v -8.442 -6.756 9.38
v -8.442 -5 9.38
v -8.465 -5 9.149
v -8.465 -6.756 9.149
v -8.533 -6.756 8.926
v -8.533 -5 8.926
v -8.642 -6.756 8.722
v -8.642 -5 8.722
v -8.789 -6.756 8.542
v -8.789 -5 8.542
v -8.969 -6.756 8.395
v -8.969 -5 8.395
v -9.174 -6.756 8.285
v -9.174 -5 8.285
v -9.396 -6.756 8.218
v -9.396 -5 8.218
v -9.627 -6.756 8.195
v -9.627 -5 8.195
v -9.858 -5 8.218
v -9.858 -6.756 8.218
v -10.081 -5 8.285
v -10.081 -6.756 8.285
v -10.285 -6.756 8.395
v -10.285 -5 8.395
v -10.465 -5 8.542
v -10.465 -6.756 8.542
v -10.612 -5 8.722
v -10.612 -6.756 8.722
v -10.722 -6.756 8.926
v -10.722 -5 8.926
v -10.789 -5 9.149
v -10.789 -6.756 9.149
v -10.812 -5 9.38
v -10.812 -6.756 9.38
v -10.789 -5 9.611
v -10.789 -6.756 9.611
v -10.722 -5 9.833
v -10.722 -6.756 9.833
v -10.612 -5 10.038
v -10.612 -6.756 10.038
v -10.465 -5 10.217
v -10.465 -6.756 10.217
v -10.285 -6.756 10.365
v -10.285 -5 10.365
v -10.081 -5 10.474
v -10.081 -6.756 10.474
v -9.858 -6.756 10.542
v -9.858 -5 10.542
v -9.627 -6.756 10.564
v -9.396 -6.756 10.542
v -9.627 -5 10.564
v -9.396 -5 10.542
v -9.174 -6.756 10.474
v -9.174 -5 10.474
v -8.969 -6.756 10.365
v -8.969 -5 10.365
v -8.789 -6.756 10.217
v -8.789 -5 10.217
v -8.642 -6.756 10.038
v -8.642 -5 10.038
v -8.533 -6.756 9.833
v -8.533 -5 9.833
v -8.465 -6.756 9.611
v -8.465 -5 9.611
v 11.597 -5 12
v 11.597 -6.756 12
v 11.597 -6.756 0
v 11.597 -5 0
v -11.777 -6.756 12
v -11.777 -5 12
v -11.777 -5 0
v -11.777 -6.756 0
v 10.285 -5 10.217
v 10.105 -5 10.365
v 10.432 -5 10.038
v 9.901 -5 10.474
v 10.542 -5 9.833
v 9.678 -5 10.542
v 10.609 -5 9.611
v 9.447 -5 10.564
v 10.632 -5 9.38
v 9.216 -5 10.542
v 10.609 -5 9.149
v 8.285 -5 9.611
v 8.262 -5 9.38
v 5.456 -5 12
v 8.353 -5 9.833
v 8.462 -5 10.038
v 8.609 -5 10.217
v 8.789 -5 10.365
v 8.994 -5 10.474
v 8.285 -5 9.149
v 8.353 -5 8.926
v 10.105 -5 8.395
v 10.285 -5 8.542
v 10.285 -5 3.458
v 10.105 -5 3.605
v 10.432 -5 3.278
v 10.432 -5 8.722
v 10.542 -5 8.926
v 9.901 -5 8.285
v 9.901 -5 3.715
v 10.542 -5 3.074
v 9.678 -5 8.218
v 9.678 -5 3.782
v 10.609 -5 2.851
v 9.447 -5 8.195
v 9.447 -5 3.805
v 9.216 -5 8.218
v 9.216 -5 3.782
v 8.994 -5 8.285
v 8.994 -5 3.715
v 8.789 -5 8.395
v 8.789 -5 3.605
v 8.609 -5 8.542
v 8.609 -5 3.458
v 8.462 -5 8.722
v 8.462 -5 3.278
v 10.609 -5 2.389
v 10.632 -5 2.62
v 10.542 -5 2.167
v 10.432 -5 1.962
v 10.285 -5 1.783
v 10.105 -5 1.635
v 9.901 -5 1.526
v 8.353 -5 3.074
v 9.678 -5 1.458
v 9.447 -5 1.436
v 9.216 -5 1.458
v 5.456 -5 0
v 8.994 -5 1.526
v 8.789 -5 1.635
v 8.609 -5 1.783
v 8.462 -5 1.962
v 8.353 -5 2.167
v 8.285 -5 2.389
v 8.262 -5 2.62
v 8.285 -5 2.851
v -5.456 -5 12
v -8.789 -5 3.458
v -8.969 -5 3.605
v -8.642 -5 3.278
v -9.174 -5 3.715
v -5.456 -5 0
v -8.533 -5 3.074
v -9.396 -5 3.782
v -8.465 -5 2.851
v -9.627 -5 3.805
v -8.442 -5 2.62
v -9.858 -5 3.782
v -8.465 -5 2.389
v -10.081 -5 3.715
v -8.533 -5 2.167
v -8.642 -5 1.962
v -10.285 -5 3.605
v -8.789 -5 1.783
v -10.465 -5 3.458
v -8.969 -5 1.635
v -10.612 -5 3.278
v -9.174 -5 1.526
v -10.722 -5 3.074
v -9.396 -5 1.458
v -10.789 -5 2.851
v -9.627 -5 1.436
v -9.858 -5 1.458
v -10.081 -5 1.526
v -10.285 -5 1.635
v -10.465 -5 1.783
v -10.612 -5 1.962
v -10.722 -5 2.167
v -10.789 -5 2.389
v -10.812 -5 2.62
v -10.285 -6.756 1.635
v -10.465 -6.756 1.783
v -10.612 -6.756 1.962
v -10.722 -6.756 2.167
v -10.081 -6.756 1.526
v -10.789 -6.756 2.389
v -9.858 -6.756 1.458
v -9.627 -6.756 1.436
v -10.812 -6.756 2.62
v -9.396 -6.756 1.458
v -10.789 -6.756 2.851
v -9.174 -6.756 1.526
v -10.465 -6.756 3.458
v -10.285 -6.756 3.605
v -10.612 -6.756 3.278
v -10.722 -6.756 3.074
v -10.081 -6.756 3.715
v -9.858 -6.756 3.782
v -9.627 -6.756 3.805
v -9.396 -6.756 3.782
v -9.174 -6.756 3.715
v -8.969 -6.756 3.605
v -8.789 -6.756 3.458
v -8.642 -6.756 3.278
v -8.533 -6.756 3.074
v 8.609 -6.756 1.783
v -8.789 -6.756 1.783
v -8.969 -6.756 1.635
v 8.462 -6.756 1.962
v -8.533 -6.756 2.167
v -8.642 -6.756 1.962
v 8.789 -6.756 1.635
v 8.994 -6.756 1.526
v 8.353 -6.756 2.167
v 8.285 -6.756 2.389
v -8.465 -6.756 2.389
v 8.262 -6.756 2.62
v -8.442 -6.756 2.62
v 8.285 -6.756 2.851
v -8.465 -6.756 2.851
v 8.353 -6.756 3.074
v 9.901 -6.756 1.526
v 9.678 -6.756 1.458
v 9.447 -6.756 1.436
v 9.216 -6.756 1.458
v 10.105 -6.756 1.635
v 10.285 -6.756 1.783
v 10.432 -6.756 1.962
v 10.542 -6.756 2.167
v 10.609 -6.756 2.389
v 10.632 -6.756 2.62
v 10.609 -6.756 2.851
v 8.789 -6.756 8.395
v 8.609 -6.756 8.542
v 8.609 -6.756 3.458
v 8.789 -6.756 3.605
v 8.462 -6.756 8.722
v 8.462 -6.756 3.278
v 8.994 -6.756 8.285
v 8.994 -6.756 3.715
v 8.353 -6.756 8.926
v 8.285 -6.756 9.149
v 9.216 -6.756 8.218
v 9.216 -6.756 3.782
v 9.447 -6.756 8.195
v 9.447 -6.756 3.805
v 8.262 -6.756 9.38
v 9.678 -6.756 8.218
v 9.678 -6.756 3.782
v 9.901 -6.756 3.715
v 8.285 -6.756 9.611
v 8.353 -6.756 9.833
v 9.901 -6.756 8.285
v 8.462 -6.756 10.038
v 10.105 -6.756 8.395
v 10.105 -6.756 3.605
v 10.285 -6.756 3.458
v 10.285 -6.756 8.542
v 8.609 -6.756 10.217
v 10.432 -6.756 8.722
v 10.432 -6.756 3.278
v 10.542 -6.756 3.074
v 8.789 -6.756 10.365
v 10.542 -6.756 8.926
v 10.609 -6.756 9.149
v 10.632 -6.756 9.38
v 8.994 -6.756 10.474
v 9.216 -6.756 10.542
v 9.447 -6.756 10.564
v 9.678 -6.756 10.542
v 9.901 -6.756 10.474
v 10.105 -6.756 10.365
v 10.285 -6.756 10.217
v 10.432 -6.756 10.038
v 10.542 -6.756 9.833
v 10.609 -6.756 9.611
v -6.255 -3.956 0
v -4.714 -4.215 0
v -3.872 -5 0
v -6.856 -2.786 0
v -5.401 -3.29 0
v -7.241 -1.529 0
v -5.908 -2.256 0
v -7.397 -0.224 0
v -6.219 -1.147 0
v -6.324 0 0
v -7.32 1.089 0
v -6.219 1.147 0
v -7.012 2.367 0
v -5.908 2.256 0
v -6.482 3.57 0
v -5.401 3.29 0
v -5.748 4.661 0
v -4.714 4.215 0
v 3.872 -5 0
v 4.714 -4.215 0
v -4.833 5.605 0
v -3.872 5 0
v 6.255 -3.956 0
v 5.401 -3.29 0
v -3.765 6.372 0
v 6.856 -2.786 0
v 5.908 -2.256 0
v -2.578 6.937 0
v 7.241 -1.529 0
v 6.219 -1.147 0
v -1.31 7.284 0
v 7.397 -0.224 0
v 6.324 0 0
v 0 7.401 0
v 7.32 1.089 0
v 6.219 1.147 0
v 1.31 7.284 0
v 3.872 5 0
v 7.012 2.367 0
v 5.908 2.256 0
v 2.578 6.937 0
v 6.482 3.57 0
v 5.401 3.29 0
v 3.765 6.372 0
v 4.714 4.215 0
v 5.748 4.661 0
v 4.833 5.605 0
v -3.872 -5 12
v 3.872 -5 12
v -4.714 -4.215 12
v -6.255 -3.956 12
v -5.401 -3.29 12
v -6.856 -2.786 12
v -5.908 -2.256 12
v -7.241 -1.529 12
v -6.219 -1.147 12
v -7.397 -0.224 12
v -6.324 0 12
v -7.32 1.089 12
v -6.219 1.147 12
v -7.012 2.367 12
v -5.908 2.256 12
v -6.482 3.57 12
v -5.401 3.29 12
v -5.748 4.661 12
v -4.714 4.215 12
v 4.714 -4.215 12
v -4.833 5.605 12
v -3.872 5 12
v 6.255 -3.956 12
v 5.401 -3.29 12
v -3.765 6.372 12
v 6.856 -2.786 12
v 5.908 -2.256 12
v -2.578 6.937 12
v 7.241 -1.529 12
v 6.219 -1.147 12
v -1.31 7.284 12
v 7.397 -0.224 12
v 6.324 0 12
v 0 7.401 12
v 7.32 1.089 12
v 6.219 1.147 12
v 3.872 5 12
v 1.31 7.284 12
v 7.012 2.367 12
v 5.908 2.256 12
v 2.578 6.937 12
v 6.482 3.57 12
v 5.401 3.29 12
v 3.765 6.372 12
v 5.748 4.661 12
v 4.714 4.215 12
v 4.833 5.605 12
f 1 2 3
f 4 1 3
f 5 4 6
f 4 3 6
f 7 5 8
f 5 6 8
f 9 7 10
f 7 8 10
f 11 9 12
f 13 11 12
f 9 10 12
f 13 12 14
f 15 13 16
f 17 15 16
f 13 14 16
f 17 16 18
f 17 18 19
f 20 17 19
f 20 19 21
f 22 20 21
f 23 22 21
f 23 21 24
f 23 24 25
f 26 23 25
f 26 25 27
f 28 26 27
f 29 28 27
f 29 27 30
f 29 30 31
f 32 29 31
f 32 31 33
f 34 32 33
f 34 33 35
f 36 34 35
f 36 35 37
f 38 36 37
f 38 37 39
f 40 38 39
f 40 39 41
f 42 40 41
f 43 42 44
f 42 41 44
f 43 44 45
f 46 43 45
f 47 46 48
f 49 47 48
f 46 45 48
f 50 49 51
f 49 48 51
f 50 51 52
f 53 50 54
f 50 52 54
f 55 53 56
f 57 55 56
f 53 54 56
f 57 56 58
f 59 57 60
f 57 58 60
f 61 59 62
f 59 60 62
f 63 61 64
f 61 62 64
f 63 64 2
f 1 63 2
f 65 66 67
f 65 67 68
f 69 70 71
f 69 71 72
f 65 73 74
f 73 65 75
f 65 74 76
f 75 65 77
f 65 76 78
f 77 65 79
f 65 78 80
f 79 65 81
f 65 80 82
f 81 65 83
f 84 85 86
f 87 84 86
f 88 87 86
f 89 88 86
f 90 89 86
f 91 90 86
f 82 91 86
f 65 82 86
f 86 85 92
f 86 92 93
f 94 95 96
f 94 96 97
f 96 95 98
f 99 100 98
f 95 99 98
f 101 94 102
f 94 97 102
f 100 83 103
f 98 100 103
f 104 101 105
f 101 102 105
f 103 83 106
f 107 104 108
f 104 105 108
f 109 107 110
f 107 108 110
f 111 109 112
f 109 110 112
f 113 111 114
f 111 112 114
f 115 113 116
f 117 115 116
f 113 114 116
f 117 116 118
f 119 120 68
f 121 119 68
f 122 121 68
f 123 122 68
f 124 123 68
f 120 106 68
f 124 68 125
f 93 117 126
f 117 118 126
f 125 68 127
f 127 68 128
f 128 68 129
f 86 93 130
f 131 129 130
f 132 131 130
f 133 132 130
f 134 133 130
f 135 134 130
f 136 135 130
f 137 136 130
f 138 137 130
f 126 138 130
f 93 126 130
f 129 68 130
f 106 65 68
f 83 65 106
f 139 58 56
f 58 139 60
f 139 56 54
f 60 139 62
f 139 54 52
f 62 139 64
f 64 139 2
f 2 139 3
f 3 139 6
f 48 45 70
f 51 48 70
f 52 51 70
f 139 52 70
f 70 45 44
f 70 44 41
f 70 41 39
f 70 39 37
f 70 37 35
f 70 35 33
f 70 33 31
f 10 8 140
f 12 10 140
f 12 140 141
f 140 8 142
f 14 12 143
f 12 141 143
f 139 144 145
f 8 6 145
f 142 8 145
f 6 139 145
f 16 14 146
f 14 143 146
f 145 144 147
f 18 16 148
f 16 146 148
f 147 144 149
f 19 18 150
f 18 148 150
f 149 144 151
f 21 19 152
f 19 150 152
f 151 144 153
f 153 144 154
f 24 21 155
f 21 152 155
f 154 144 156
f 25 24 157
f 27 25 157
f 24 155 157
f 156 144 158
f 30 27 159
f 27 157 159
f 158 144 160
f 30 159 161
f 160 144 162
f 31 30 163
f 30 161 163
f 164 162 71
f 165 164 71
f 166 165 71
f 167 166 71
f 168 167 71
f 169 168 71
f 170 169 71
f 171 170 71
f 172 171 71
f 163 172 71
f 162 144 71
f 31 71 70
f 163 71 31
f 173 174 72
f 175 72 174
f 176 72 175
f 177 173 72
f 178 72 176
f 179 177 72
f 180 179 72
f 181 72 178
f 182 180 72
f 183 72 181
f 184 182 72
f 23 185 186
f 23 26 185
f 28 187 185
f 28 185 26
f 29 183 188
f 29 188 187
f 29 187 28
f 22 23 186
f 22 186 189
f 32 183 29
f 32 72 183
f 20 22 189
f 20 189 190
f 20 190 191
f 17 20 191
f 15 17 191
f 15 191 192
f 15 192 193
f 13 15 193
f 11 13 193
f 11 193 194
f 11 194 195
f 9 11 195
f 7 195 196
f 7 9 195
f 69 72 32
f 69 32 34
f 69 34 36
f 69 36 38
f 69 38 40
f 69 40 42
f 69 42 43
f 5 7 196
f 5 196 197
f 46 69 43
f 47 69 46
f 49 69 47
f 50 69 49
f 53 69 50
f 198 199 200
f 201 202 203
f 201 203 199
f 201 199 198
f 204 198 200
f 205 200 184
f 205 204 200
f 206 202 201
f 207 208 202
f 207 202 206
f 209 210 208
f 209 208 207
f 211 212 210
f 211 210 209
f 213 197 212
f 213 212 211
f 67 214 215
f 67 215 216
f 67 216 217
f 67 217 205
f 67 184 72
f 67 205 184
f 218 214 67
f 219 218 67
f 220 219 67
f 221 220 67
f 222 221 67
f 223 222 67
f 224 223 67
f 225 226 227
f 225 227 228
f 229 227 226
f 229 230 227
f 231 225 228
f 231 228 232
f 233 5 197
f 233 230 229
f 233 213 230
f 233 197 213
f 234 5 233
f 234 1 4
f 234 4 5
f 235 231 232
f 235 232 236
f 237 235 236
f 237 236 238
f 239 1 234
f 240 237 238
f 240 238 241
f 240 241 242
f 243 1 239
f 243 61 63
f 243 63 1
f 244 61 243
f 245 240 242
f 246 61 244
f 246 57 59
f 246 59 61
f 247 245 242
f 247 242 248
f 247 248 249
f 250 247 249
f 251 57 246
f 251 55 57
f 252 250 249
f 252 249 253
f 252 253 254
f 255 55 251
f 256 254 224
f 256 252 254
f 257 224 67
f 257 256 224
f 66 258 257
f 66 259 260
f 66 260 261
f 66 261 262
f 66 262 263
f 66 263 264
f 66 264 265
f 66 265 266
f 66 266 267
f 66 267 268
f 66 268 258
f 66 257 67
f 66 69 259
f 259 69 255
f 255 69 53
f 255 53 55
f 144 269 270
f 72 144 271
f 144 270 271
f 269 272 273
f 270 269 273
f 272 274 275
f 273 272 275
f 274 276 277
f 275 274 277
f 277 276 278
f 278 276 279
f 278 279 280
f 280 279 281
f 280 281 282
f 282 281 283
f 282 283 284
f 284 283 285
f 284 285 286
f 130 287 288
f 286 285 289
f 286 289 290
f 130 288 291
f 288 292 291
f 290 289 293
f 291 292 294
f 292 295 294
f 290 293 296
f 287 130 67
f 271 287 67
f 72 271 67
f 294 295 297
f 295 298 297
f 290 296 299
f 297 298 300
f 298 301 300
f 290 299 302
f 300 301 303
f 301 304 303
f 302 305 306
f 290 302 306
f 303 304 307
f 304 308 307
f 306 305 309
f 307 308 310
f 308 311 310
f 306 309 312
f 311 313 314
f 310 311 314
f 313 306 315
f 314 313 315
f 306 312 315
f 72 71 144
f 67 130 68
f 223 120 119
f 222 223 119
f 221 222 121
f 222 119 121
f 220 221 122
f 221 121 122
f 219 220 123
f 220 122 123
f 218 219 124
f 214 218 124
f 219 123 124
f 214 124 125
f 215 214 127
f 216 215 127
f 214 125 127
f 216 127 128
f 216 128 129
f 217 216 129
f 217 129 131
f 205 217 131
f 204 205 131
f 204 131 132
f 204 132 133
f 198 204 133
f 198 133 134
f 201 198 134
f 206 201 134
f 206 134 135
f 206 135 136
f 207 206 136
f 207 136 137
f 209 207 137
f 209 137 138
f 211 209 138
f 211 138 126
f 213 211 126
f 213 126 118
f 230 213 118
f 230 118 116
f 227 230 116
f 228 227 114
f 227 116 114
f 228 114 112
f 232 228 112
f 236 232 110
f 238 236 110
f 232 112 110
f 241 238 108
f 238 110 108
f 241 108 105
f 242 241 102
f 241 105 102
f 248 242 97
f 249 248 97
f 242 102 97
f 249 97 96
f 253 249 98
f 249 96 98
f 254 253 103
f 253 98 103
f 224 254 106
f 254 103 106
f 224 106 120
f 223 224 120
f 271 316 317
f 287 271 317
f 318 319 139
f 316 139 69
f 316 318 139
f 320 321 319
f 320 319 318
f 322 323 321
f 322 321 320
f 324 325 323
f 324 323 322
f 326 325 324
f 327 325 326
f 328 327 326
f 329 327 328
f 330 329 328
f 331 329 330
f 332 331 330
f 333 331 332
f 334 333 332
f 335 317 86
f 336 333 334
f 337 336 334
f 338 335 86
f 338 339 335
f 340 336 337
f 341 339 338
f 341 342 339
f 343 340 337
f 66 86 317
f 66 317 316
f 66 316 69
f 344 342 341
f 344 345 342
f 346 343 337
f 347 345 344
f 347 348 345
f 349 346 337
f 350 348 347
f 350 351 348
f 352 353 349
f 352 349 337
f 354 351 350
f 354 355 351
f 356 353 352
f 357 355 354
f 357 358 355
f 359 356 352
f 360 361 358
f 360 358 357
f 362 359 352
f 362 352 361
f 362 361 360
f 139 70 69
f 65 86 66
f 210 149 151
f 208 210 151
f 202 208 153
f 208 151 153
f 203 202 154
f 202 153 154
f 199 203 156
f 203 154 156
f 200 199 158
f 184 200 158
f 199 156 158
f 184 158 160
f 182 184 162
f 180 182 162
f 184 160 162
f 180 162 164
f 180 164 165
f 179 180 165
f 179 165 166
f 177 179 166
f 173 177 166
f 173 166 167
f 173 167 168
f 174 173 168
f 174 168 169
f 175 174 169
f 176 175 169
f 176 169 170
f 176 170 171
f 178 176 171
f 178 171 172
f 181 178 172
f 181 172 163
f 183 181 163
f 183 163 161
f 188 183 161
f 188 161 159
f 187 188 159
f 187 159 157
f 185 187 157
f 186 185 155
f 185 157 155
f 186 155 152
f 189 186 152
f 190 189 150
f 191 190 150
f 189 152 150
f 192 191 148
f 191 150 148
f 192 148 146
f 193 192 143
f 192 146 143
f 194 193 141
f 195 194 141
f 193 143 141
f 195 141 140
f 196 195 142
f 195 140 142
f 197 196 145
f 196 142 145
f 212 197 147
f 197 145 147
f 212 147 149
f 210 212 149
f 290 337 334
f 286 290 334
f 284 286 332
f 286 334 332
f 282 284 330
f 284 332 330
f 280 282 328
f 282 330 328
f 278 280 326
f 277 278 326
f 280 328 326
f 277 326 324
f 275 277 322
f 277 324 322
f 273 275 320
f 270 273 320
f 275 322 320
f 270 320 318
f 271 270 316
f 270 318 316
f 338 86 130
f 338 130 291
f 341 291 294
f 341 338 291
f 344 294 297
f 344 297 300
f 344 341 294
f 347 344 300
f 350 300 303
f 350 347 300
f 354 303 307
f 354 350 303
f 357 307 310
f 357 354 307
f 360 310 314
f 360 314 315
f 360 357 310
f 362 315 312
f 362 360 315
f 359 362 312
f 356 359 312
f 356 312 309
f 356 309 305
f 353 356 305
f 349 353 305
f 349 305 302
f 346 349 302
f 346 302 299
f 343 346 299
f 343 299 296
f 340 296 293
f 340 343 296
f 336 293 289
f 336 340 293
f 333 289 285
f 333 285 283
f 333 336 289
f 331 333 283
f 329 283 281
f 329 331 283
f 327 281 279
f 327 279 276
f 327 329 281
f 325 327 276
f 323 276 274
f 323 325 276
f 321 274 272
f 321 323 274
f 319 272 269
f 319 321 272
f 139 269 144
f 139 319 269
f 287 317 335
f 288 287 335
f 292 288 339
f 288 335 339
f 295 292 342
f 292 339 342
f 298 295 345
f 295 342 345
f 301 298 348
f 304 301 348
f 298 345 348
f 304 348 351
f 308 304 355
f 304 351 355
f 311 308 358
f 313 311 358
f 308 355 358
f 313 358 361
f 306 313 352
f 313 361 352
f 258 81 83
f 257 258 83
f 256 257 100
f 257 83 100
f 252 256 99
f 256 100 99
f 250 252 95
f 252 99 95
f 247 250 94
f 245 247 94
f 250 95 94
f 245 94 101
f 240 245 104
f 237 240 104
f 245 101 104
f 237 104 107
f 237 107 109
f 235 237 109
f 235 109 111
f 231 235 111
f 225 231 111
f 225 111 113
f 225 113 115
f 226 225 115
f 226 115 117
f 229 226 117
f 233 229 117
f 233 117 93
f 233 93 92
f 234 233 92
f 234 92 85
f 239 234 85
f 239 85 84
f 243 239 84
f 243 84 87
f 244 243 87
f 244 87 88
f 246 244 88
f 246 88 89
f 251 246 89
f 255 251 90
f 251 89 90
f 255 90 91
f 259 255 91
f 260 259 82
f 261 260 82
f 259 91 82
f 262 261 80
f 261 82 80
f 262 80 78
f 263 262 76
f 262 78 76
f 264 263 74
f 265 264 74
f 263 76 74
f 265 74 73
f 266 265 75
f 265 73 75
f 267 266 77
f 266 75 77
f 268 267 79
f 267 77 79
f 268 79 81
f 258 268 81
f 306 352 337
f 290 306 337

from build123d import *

# Parameters (mm, degrees)
BOSS_EXTRUDE1_DEPTH = 12
SKETCH3_R           = 1.184698277
CUT_EXTRUDE3_DEPTH  = 5
BOSS_EXTRUDE6_DEPTH = 12
CUT_EXTRUDE4_DEPTH  = 12
SKETCH10_R          = 1.184698277
CUT_EXTRUDE5_DEPTH  = 12
CUT_EXTRUDE7_DEPTH  = 19


with BuildPart() as part:
    # Sketch1 → Boss-Extrude1 (new body)
    with BuildSketch(Plane.XY):
        with BuildLine():
            Line((-4.775747962, -5), (-3.406624892, -5))
            ThreePointArc((-3.406624892, -5), (-6.090000101, 0), (-3.406624892, 5))
            Line((-3.406624892, 5), (3.226624689, 5))
            ThreePointArc((3.226624689, 5), (5.909999899, 0), (3.226624689, -5))
            Line((3.226624689, -5), (4.595747759, -5))
            ThreePointArc((4.595747759, -5), (-0.090000101, 6.852461821), (-4.775747962, -5))
        make_face()
        with BuildLine():
            Line((11.597073435, -5), (4.595747759, -5))
            ThreePointArc((4.595747759, -5), (3.939029098, -5.542847348), (3.220019991, -6))
            Line((3.220019991, -6), (11.597073435, -6))
            Line((11.597073435, -6), (11.597073435, -5))
        make_face()
        with BuildLine():
            Line((3.226624689, -5), (-3.406624892, -5))
            Line((-3.406624892, -5), (-4.775747962, -5))
            ThreePointArc((-4.775747962, -5), (-4.119029301, -5.542847348), (-3.400020194, -6))
            Line((-3.400020194, -6), (3.220019991, -6))
            ThreePointArc((3.220019991, -6), (3.939029098, -5.542847348), (4.595747759, -5))
            Line((4.595747759, -5), (3.226624689, -5))
        make_face()
        with BuildLine():
            ThreePointArc((-3.400020194, -6), (-4.119029301, -5.542847348), (-4.775747962, -5))
            Line((-4.775747962, -5), (-11.777073637, -5))
            Line((-11.777073637, -5), (-11.777073637, -6))
            Line((-11.777073637, -6), (-3.400020194, -6))
        make_face()
    extrude(amount=BOSS_EXTRUDE1_DEPTH)

    # Sketch3 → Cut-Extrude3 (cut)
    with BuildSketch(Plane(origin=(0, -5, 0), x_dir=(1, 0, 0), z_dir=(0, 1, 0))):
        with Locations((-9.627163284, -9.379788166)):
            Circle(SKETCH3_R)
        with Locations((9.447163082, -9.379788166)):
            Circle(SKETCH3_R)
        with Locations((9.447163082, -2.620211834)):
            Circle(SKETCH3_R)
        with Locations((-9.627163284, -2.620211834)):
            Circle(SKETCH3_R)
    extrude(amount=-CUT_EXTRUDE3_DEPTH, mode=Mode.SUBTRACT)

    # Sketch7 → Boss-Extrude6 (add)
    with BuildSketch(Plane.XY.offset(12)):
        with BuildLine():
            ThreePointArc((5.456145908, -5), (0, 7.400643767), (-5.456145908, -5))
            Line((-5.456145908, -5), (-4.775747962, -5))
            ThreePointArc((-4.775747962, -5), (-0.090000101, 6.852461821), (4.595747759, -5))
            Line((4.595747759, -5), (5.456145908, -5))
        make_face()
        with BuildLine():
            Line((-4.33238135, -6), (-11.777073637, -6))
            Line((-11.777073637, -6), (-11.777073637, -6.756480667))
            Line((-11.777073637, -6.756480667), (-3.019850519, -6.756480667))
            ThreePointArc((-3.019850519, -6.756480667), (-3.695523524, -6.411913447), (-4.33238135, -6))
        make_face()
        with BuildLine():
            Line((4.33238135, -6), (-4.33238135, -6))
            ThreePointArc((-4.33238135, -6), (-3.695523524, -6.411913447), (-3.019850519, -6.756480667))
            Line((-3.019850519, -6.756480667), (3.019850519, -6.756480667))
            ThreePointArc((3.019850519, -6.756480667), (3.695523524, -6.411913447), (4.33238135, -6))
        make_face()
        with BuildLine():
            Line((11.597073435, -6), (4.33238135, -6))
            ThreePointArc((4.33238135, -6), (3.695523524, -6.411913447), (3.019850519, -6.756480667))
            Line((3.019850519, -6.756480667), (11.597073435, -6.756480667))
            Line((11.597073435, -6.756480667), (11.597073435, -6))
        make_face()
    extrude(amount=-BOSS_EXTRUDE6_DEPTH)

    # Sketch9 → Cut-Extrude4 (cut)
    with BuildSketch(Plane.XY.offset(12)):
        with BuildLine():
            Line((-3.476794678, 5), (3.476794678, 5))
            ThreePointArc((3.476794678, 5), (6.090000101, 0), (3.476794678, -5))
            Line((3.476794678, -5), (-3.476794678, -5))
            ThreePointArc((-3.476794678, -5), (-6.090000101, 0), (-3.476794678, 5))
        make_face()
    extrude(amount=-CUT_EXTRUDE4_DEPTH, mode=Mode.SUBTRACT)

    # Sketch10 → Cut-Extrude5 (cut)
    with BuildSketch(Plane(origin=(0, -5, 0), x_dir=(1, 0, 0), z_dir=(0, 1, 0))):
        with Locations((-9.627163284, -2.620211834)):
            Circle(SKETCH10_R)
        with Locations((-9.627163284, -9.379788166)):
            Circle(SKETCH10_R)
        with Locations((9.447163082, -2.620211834)):
            Circle(SKETCH10_R)
        with Locations((9.447163082, -9.379788166)):
            Circle(SKETCH10_R)
    extrude(amount=-CUT_EXTRUDE5_DEPTH, mode=Mode.SUBTRACT)

    # Sketch11 → Cut-Extrude7 (cut)
    with BuildSketch(Plane.XY.offset(12)):
        with BuildLine():
            Line((-3.476794678, 5), (-3.871774203, 5))
            ThreePointArc((-3.871774203, 5), (-6.323814947, 0), (-3.871774203, -5))
            Line((-3.871774203, -5), (-3.476794678, -5))
            Line((-3.476794678, -5), (3.871774203, -5))
            ThreePointArc((3.871774203, -5), (6.323814947, 0), (3.871774203, 5))
            Line((3.871774203, 5), (-3.476794678, 5))
        make_face()
    extrude(amount=-CUT_EXTRUDE7_DEPTH, mode=Mode.SUBTRACT)


solid = part.part
